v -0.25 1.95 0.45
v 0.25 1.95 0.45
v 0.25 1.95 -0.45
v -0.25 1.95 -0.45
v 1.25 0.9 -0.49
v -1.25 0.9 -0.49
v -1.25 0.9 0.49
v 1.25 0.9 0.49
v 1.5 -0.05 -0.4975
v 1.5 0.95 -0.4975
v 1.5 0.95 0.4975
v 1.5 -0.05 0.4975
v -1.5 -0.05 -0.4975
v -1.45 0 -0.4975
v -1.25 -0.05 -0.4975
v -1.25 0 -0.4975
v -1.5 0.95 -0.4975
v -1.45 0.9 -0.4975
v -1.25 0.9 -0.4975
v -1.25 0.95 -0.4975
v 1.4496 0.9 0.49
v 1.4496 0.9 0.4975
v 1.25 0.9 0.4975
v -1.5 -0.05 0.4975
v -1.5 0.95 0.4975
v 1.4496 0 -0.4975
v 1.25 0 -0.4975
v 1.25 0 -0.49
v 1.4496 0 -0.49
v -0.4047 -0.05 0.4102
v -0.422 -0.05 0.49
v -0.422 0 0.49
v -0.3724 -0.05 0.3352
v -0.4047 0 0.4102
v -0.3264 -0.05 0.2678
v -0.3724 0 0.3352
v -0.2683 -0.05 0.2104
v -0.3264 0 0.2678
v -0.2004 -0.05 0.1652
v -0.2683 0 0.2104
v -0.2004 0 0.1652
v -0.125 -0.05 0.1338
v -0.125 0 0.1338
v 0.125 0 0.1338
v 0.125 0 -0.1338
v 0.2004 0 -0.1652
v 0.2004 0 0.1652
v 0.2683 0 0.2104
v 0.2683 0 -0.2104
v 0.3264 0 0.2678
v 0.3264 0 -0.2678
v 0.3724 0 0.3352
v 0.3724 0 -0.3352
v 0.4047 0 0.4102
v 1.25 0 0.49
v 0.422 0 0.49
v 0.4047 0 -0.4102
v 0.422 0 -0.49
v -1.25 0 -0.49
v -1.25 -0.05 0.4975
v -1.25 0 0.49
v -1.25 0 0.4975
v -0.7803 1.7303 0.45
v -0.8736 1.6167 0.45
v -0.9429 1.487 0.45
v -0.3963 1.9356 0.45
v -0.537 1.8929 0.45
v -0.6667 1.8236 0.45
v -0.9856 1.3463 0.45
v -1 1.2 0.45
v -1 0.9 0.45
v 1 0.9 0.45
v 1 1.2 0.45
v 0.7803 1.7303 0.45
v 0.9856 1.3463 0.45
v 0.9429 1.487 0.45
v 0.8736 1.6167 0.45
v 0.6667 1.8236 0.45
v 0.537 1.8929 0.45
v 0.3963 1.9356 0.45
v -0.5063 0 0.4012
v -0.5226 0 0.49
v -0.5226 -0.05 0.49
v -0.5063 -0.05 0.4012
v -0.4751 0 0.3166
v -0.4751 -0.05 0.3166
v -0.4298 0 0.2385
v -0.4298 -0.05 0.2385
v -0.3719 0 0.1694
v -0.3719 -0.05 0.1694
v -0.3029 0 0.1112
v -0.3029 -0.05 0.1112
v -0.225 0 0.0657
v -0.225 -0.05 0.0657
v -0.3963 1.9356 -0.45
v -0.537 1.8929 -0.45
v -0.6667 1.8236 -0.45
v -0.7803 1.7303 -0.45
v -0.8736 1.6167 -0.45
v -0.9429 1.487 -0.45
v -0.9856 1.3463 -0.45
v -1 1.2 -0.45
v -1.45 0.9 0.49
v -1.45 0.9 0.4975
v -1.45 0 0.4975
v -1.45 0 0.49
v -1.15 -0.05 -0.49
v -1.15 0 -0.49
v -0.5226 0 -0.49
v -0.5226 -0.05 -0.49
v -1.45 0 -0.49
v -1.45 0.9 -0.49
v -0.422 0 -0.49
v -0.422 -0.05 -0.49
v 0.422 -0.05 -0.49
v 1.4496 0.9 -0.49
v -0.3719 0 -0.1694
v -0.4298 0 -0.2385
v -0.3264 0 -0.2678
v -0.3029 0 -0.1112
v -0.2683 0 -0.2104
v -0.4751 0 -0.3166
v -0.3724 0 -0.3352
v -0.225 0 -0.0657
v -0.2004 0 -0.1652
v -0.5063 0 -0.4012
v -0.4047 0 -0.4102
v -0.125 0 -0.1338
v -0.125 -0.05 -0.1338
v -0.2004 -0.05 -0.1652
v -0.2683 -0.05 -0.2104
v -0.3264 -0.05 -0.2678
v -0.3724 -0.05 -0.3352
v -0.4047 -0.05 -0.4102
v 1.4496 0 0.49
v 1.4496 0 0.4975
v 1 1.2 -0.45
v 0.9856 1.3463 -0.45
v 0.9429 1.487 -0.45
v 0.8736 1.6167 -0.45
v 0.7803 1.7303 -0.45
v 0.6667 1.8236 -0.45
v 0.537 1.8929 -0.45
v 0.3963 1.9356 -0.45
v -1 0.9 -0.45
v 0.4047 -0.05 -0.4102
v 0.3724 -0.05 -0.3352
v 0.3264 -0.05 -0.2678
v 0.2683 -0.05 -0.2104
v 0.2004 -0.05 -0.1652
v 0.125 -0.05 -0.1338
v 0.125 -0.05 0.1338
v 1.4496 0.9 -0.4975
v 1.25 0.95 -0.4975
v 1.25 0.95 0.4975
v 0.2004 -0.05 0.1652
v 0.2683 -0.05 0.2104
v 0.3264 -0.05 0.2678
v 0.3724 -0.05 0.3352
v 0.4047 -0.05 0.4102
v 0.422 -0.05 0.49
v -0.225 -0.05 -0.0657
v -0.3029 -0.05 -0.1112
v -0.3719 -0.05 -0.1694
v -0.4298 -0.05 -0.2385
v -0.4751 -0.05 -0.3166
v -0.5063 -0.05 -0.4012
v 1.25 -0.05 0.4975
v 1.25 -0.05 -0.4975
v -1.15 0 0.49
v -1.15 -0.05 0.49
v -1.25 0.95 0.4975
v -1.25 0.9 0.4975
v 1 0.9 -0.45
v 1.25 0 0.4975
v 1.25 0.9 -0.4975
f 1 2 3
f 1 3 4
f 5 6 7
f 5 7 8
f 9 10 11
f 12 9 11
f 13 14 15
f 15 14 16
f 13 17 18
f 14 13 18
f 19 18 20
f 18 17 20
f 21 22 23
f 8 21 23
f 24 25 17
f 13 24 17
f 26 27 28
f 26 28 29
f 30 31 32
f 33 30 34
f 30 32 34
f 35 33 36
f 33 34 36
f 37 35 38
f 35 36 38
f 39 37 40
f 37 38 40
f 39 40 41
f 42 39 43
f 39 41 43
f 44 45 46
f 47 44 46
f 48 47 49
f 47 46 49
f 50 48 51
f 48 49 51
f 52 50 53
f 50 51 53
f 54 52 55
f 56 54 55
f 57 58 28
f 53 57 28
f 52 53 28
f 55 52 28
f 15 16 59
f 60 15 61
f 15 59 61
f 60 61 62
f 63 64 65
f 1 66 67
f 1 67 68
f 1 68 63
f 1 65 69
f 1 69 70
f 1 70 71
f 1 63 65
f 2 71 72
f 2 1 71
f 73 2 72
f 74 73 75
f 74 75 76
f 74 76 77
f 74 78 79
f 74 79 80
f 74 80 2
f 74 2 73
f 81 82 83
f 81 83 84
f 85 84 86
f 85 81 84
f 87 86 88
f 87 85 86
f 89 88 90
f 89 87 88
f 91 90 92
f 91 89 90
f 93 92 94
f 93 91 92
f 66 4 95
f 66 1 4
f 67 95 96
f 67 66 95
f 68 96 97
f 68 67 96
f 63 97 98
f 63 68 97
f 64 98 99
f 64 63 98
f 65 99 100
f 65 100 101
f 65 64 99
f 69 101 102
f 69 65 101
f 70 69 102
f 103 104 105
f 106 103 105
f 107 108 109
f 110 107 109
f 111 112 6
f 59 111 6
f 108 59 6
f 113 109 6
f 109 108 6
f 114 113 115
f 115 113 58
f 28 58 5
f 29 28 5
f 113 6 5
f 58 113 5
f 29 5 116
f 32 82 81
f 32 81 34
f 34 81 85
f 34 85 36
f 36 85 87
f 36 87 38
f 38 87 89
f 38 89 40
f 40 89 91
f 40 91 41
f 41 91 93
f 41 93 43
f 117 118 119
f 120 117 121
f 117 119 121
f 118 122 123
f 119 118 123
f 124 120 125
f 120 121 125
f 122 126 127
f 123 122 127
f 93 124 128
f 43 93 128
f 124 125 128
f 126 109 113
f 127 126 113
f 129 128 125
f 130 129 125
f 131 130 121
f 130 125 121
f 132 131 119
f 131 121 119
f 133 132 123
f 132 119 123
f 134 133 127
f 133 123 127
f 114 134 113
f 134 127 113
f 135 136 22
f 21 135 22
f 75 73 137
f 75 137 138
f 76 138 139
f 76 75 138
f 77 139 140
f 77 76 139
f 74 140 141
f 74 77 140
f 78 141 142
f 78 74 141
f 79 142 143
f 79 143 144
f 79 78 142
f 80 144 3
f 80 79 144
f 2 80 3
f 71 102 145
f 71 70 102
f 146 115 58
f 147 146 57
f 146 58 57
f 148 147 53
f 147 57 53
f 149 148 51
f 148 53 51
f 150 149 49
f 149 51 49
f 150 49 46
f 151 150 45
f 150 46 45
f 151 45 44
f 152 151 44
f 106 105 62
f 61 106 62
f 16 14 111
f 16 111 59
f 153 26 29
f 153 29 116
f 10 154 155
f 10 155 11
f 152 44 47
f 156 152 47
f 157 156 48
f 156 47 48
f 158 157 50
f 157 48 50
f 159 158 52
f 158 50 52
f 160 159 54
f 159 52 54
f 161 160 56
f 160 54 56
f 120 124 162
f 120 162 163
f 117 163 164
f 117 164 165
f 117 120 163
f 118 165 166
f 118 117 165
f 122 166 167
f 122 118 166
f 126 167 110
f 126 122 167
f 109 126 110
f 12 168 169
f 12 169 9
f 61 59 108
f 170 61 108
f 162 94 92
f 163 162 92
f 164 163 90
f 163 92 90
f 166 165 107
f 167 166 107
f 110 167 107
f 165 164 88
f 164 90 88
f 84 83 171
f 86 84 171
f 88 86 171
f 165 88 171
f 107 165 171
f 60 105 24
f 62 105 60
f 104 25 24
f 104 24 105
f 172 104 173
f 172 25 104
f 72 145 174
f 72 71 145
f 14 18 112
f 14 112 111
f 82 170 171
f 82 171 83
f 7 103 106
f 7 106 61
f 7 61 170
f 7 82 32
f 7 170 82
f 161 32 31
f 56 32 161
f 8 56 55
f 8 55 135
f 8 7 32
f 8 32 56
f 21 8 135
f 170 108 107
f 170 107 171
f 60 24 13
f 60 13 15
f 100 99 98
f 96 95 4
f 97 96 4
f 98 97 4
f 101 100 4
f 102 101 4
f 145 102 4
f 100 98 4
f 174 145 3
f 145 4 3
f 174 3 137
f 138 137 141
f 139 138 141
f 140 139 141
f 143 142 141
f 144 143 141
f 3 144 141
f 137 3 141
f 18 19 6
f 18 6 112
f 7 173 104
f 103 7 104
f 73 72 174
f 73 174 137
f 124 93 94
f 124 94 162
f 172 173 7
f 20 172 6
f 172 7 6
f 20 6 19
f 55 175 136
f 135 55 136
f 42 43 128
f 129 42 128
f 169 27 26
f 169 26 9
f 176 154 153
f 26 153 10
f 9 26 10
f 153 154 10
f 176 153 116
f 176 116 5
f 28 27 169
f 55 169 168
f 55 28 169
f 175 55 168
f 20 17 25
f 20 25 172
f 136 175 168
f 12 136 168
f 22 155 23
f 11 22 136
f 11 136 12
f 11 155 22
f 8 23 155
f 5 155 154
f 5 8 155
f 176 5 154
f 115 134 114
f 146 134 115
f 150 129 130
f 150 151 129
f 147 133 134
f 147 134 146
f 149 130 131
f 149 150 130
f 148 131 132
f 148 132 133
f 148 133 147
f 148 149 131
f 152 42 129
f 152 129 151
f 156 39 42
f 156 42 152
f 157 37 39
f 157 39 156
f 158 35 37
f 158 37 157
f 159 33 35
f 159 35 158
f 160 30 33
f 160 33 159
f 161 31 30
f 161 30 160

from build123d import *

# Parameters (mm, degrees)
SKIZZE1_W                       = 2.9
SKIZZE1_H                       = 0.98
LINEAR_AUSTRAGEN1_DEPTH         = 0.9
LINEAR_AUSTRAGEN2_DEPTH         = 0.45
SKIZZE5_W                       = 3
SKIZZE5_H                       = 1.08
SKIZZE5_W_2                     = 2.9
SKIZZE5_H_2                     = 0.98
LINEAR_AUSTRAGEN6_DEPTH         = 0.9
SKIZZE6_W                       = 0.25
SKIZZE6_H                       = 1.08
LINEAR_AUSTRAGEN7_DEPTH         = 0.05
SKIZZE7_W                       = 0.25
SKIZZE7_H                       = 1.08
LINEAR_AUSTRAGEN8_DEPTH         = 0.05
LINEAR_AUSTRAGEN9_DEPTH         = 0.05
SCHNITT_LINEAR_AUSTRAGEN2_DEPTH = 0.05
SKIZZE10_W                      = 3
SKIZZE10_H                      = 1
SCHNITT_LINEAR_AUSTRAGEN3_DEPTH = 0.0425


with BuildPart() as part:
    # Skizze1 → Linear austragen1 (new body)
    with BuildSketch(Plane(origin=(0, 0, 0), x_dir=(1, 0, 0), z_dir=(0, 1, 0))):
        Rectangle(SKIZZE1_W, SKIZZE1_H)
    extrude(amount=LINEAR_AUSTRAGEN1_DEPTH)



with BuildPart() as body_2:
    # Skizze2 → Linear austragen2 (new body, symmetric)
    with BuildSketch(Plane.XY):
        with BuildLine():
            Line((-1, 0.9), (1, 0.9))
            Line((1, 0.9), (1, 1.2))
            ThreePointArc((1, 1.2), (0.780330086, 1.730330086), (0.25, 1.95))
            Line((0.25, 1.95), (-0.25, 1.95))
            ThreePointArc((-0.25, 1.95), (-0.780330086, 1.730330086), (-1, 1.2))
            Line((-1, 1.2), (-1, 0.9))
        make_face()
    extrude(amount=LINEAR_AUSTRAGEN2_DEPTH, both=True)


with BuildPart() as body_3:
    # Skizze5 → Linear austragen6 (new body)
    with BuildSketch(Plane(origin=(0, 0.9, 0), x_dir=(1, 0, 0), z_dir=(0, 1, 0))):
        Rectangle(SKIZZE5_W, SKIZZE5_H)
        Rectangle(SKIZZE5_W_2, SKIZZE5_H_2, mode=Mode.SUBTRACT)
    extrude(amount=-LINEAR_AUSTRAGEN6_DEPTH)


with BuildPart() as part_1:
    add(part.part)

    add(body_3.part)  # Linear austragen7 merges body 3
    # Skizze6 → Linear austragen7 (add)
    with BuildSketch(Plane(origin=(0, 0.9, 0), x_dir=(1, 0, 0), z_dir=(0, 1, 0))):
        with Locations((1.375, 0)):
            Rectangle(SKIZZE6_W, SKIZZE6_H)
        with Locations((-1.375, 0)):
            Rectangle(SKIZZE6_W, SKIZZE6_H)
    extrude(amount=LINEAR_AUSTRAGEN7_DEPTH)

    # Skizze7 → Linear austragen8 (add)
    with BuildSketch(Plane.XZ):
        with Locations((1.375, 0)):
            Rectangle(SKIZZE7_W, SKIZZE7_H)
        with Locations((-1.375, 0)):
            Rectangle(SKIZZE7_W, SKIZZE7_H)
    extrude(amount=LINEAR_AUSTRAGEN8_DEPTH)

    # Skizze8 → Linear austragen9 (add)
    with BuildSketch(Plane.XZ):
        with BuildLine():
            Line((-0.125, 0.13379808), (-0.125, -0.13379808))
            ThreePointArc((-0.125, -0.13379808), (-0.341869858, -0.287512377), (-0.425, -0.54))
            Line((-0.425, -0.54), (0.425, -0.54))
            ThreePointArc((0.425, -0.54), (0.341869858, -0.287512377), (0.125, -0.13379808))
            Line((0.125, -0.13379808), (0.125, 0.13379808))
            ThreePointArc((0.125, 0.13379808), (0.341869858, 0.287512377), (0.425, 0.54))
            Line((0.425, 0.54), (-0.425, 0.54))
            ThreePointArc((-0.425, 0.54), (-0.341869858, 0.287512377), (-0.125, 0.13379808))
        make_face()
        with BuildLine():
            Line((-0.225, 0.065658351), (-0.225, -0.065658351))
            ThreePointArc((-0.225, -0.065658351), (-0.443705984, -0.259375696), (-0.525, -0.54))
            Line((-0.525, -0.54), (-1.15, -0.54))
            Line((-1.15, -0.54), (-1.15, 0.54))
            Line((-1.15, 0.54), (-0.525, 0.54))
            ThreePointArc((-0.525, 0.54), (-0.443705984, 0.259375696), (-0.225, 0.065658351))
        make_face()
    extrude(amount=LINEAR_AUSTRAGEN9_DEPTH)

    # Skizze9 → Schnitt-Linear austragen2 (cut)
    with BuildSketch(Plane.XY.offset(0.54)):
        Polygon((-1.45, 0.9), (-1.45, 0), (-1.25, 0), (-1.25, -0.05), (1.25, -0.05), (1.25, 0), (1.449568933, 0), (1.449568933, 0.9), align=None)
    schnitt_linear_austragen2 = extrude(amount=-SCHNITT_LINEAR_AUSTRAGEN2_DEPTH, mode=Mode.SUBTRACT)

    # Spiegeln1: Schnitt-Linear austragen2 across plane
    add(schnitt_linear_austragen2.mirror(Plane.XY), mode=Mode.SUBTRACT)

    # Skizze10 → Schnitt-Linear austragen3 (cut)
    with BuildSketch(Plane.XY.offset(0.54)):
        with Locations((0, 0.45)):
            Rectangle(SKIZZE10_W, SKIZZE10_H)
    schnitt_linear_austragen3 = extrude(amount=-SCHNITT_LINEAR_AUSTRAGEN3_DEPTH, mode=Mode.SUBTRACT)

    # Spiegeln2: Schnitt-Linear austragen3 across plane
    add(schnitt_linear_austragen3.mirror(Plane.XY), mode=Mode.SUBTRACT)


solid = Compound([body_2.part, part_1.part])
